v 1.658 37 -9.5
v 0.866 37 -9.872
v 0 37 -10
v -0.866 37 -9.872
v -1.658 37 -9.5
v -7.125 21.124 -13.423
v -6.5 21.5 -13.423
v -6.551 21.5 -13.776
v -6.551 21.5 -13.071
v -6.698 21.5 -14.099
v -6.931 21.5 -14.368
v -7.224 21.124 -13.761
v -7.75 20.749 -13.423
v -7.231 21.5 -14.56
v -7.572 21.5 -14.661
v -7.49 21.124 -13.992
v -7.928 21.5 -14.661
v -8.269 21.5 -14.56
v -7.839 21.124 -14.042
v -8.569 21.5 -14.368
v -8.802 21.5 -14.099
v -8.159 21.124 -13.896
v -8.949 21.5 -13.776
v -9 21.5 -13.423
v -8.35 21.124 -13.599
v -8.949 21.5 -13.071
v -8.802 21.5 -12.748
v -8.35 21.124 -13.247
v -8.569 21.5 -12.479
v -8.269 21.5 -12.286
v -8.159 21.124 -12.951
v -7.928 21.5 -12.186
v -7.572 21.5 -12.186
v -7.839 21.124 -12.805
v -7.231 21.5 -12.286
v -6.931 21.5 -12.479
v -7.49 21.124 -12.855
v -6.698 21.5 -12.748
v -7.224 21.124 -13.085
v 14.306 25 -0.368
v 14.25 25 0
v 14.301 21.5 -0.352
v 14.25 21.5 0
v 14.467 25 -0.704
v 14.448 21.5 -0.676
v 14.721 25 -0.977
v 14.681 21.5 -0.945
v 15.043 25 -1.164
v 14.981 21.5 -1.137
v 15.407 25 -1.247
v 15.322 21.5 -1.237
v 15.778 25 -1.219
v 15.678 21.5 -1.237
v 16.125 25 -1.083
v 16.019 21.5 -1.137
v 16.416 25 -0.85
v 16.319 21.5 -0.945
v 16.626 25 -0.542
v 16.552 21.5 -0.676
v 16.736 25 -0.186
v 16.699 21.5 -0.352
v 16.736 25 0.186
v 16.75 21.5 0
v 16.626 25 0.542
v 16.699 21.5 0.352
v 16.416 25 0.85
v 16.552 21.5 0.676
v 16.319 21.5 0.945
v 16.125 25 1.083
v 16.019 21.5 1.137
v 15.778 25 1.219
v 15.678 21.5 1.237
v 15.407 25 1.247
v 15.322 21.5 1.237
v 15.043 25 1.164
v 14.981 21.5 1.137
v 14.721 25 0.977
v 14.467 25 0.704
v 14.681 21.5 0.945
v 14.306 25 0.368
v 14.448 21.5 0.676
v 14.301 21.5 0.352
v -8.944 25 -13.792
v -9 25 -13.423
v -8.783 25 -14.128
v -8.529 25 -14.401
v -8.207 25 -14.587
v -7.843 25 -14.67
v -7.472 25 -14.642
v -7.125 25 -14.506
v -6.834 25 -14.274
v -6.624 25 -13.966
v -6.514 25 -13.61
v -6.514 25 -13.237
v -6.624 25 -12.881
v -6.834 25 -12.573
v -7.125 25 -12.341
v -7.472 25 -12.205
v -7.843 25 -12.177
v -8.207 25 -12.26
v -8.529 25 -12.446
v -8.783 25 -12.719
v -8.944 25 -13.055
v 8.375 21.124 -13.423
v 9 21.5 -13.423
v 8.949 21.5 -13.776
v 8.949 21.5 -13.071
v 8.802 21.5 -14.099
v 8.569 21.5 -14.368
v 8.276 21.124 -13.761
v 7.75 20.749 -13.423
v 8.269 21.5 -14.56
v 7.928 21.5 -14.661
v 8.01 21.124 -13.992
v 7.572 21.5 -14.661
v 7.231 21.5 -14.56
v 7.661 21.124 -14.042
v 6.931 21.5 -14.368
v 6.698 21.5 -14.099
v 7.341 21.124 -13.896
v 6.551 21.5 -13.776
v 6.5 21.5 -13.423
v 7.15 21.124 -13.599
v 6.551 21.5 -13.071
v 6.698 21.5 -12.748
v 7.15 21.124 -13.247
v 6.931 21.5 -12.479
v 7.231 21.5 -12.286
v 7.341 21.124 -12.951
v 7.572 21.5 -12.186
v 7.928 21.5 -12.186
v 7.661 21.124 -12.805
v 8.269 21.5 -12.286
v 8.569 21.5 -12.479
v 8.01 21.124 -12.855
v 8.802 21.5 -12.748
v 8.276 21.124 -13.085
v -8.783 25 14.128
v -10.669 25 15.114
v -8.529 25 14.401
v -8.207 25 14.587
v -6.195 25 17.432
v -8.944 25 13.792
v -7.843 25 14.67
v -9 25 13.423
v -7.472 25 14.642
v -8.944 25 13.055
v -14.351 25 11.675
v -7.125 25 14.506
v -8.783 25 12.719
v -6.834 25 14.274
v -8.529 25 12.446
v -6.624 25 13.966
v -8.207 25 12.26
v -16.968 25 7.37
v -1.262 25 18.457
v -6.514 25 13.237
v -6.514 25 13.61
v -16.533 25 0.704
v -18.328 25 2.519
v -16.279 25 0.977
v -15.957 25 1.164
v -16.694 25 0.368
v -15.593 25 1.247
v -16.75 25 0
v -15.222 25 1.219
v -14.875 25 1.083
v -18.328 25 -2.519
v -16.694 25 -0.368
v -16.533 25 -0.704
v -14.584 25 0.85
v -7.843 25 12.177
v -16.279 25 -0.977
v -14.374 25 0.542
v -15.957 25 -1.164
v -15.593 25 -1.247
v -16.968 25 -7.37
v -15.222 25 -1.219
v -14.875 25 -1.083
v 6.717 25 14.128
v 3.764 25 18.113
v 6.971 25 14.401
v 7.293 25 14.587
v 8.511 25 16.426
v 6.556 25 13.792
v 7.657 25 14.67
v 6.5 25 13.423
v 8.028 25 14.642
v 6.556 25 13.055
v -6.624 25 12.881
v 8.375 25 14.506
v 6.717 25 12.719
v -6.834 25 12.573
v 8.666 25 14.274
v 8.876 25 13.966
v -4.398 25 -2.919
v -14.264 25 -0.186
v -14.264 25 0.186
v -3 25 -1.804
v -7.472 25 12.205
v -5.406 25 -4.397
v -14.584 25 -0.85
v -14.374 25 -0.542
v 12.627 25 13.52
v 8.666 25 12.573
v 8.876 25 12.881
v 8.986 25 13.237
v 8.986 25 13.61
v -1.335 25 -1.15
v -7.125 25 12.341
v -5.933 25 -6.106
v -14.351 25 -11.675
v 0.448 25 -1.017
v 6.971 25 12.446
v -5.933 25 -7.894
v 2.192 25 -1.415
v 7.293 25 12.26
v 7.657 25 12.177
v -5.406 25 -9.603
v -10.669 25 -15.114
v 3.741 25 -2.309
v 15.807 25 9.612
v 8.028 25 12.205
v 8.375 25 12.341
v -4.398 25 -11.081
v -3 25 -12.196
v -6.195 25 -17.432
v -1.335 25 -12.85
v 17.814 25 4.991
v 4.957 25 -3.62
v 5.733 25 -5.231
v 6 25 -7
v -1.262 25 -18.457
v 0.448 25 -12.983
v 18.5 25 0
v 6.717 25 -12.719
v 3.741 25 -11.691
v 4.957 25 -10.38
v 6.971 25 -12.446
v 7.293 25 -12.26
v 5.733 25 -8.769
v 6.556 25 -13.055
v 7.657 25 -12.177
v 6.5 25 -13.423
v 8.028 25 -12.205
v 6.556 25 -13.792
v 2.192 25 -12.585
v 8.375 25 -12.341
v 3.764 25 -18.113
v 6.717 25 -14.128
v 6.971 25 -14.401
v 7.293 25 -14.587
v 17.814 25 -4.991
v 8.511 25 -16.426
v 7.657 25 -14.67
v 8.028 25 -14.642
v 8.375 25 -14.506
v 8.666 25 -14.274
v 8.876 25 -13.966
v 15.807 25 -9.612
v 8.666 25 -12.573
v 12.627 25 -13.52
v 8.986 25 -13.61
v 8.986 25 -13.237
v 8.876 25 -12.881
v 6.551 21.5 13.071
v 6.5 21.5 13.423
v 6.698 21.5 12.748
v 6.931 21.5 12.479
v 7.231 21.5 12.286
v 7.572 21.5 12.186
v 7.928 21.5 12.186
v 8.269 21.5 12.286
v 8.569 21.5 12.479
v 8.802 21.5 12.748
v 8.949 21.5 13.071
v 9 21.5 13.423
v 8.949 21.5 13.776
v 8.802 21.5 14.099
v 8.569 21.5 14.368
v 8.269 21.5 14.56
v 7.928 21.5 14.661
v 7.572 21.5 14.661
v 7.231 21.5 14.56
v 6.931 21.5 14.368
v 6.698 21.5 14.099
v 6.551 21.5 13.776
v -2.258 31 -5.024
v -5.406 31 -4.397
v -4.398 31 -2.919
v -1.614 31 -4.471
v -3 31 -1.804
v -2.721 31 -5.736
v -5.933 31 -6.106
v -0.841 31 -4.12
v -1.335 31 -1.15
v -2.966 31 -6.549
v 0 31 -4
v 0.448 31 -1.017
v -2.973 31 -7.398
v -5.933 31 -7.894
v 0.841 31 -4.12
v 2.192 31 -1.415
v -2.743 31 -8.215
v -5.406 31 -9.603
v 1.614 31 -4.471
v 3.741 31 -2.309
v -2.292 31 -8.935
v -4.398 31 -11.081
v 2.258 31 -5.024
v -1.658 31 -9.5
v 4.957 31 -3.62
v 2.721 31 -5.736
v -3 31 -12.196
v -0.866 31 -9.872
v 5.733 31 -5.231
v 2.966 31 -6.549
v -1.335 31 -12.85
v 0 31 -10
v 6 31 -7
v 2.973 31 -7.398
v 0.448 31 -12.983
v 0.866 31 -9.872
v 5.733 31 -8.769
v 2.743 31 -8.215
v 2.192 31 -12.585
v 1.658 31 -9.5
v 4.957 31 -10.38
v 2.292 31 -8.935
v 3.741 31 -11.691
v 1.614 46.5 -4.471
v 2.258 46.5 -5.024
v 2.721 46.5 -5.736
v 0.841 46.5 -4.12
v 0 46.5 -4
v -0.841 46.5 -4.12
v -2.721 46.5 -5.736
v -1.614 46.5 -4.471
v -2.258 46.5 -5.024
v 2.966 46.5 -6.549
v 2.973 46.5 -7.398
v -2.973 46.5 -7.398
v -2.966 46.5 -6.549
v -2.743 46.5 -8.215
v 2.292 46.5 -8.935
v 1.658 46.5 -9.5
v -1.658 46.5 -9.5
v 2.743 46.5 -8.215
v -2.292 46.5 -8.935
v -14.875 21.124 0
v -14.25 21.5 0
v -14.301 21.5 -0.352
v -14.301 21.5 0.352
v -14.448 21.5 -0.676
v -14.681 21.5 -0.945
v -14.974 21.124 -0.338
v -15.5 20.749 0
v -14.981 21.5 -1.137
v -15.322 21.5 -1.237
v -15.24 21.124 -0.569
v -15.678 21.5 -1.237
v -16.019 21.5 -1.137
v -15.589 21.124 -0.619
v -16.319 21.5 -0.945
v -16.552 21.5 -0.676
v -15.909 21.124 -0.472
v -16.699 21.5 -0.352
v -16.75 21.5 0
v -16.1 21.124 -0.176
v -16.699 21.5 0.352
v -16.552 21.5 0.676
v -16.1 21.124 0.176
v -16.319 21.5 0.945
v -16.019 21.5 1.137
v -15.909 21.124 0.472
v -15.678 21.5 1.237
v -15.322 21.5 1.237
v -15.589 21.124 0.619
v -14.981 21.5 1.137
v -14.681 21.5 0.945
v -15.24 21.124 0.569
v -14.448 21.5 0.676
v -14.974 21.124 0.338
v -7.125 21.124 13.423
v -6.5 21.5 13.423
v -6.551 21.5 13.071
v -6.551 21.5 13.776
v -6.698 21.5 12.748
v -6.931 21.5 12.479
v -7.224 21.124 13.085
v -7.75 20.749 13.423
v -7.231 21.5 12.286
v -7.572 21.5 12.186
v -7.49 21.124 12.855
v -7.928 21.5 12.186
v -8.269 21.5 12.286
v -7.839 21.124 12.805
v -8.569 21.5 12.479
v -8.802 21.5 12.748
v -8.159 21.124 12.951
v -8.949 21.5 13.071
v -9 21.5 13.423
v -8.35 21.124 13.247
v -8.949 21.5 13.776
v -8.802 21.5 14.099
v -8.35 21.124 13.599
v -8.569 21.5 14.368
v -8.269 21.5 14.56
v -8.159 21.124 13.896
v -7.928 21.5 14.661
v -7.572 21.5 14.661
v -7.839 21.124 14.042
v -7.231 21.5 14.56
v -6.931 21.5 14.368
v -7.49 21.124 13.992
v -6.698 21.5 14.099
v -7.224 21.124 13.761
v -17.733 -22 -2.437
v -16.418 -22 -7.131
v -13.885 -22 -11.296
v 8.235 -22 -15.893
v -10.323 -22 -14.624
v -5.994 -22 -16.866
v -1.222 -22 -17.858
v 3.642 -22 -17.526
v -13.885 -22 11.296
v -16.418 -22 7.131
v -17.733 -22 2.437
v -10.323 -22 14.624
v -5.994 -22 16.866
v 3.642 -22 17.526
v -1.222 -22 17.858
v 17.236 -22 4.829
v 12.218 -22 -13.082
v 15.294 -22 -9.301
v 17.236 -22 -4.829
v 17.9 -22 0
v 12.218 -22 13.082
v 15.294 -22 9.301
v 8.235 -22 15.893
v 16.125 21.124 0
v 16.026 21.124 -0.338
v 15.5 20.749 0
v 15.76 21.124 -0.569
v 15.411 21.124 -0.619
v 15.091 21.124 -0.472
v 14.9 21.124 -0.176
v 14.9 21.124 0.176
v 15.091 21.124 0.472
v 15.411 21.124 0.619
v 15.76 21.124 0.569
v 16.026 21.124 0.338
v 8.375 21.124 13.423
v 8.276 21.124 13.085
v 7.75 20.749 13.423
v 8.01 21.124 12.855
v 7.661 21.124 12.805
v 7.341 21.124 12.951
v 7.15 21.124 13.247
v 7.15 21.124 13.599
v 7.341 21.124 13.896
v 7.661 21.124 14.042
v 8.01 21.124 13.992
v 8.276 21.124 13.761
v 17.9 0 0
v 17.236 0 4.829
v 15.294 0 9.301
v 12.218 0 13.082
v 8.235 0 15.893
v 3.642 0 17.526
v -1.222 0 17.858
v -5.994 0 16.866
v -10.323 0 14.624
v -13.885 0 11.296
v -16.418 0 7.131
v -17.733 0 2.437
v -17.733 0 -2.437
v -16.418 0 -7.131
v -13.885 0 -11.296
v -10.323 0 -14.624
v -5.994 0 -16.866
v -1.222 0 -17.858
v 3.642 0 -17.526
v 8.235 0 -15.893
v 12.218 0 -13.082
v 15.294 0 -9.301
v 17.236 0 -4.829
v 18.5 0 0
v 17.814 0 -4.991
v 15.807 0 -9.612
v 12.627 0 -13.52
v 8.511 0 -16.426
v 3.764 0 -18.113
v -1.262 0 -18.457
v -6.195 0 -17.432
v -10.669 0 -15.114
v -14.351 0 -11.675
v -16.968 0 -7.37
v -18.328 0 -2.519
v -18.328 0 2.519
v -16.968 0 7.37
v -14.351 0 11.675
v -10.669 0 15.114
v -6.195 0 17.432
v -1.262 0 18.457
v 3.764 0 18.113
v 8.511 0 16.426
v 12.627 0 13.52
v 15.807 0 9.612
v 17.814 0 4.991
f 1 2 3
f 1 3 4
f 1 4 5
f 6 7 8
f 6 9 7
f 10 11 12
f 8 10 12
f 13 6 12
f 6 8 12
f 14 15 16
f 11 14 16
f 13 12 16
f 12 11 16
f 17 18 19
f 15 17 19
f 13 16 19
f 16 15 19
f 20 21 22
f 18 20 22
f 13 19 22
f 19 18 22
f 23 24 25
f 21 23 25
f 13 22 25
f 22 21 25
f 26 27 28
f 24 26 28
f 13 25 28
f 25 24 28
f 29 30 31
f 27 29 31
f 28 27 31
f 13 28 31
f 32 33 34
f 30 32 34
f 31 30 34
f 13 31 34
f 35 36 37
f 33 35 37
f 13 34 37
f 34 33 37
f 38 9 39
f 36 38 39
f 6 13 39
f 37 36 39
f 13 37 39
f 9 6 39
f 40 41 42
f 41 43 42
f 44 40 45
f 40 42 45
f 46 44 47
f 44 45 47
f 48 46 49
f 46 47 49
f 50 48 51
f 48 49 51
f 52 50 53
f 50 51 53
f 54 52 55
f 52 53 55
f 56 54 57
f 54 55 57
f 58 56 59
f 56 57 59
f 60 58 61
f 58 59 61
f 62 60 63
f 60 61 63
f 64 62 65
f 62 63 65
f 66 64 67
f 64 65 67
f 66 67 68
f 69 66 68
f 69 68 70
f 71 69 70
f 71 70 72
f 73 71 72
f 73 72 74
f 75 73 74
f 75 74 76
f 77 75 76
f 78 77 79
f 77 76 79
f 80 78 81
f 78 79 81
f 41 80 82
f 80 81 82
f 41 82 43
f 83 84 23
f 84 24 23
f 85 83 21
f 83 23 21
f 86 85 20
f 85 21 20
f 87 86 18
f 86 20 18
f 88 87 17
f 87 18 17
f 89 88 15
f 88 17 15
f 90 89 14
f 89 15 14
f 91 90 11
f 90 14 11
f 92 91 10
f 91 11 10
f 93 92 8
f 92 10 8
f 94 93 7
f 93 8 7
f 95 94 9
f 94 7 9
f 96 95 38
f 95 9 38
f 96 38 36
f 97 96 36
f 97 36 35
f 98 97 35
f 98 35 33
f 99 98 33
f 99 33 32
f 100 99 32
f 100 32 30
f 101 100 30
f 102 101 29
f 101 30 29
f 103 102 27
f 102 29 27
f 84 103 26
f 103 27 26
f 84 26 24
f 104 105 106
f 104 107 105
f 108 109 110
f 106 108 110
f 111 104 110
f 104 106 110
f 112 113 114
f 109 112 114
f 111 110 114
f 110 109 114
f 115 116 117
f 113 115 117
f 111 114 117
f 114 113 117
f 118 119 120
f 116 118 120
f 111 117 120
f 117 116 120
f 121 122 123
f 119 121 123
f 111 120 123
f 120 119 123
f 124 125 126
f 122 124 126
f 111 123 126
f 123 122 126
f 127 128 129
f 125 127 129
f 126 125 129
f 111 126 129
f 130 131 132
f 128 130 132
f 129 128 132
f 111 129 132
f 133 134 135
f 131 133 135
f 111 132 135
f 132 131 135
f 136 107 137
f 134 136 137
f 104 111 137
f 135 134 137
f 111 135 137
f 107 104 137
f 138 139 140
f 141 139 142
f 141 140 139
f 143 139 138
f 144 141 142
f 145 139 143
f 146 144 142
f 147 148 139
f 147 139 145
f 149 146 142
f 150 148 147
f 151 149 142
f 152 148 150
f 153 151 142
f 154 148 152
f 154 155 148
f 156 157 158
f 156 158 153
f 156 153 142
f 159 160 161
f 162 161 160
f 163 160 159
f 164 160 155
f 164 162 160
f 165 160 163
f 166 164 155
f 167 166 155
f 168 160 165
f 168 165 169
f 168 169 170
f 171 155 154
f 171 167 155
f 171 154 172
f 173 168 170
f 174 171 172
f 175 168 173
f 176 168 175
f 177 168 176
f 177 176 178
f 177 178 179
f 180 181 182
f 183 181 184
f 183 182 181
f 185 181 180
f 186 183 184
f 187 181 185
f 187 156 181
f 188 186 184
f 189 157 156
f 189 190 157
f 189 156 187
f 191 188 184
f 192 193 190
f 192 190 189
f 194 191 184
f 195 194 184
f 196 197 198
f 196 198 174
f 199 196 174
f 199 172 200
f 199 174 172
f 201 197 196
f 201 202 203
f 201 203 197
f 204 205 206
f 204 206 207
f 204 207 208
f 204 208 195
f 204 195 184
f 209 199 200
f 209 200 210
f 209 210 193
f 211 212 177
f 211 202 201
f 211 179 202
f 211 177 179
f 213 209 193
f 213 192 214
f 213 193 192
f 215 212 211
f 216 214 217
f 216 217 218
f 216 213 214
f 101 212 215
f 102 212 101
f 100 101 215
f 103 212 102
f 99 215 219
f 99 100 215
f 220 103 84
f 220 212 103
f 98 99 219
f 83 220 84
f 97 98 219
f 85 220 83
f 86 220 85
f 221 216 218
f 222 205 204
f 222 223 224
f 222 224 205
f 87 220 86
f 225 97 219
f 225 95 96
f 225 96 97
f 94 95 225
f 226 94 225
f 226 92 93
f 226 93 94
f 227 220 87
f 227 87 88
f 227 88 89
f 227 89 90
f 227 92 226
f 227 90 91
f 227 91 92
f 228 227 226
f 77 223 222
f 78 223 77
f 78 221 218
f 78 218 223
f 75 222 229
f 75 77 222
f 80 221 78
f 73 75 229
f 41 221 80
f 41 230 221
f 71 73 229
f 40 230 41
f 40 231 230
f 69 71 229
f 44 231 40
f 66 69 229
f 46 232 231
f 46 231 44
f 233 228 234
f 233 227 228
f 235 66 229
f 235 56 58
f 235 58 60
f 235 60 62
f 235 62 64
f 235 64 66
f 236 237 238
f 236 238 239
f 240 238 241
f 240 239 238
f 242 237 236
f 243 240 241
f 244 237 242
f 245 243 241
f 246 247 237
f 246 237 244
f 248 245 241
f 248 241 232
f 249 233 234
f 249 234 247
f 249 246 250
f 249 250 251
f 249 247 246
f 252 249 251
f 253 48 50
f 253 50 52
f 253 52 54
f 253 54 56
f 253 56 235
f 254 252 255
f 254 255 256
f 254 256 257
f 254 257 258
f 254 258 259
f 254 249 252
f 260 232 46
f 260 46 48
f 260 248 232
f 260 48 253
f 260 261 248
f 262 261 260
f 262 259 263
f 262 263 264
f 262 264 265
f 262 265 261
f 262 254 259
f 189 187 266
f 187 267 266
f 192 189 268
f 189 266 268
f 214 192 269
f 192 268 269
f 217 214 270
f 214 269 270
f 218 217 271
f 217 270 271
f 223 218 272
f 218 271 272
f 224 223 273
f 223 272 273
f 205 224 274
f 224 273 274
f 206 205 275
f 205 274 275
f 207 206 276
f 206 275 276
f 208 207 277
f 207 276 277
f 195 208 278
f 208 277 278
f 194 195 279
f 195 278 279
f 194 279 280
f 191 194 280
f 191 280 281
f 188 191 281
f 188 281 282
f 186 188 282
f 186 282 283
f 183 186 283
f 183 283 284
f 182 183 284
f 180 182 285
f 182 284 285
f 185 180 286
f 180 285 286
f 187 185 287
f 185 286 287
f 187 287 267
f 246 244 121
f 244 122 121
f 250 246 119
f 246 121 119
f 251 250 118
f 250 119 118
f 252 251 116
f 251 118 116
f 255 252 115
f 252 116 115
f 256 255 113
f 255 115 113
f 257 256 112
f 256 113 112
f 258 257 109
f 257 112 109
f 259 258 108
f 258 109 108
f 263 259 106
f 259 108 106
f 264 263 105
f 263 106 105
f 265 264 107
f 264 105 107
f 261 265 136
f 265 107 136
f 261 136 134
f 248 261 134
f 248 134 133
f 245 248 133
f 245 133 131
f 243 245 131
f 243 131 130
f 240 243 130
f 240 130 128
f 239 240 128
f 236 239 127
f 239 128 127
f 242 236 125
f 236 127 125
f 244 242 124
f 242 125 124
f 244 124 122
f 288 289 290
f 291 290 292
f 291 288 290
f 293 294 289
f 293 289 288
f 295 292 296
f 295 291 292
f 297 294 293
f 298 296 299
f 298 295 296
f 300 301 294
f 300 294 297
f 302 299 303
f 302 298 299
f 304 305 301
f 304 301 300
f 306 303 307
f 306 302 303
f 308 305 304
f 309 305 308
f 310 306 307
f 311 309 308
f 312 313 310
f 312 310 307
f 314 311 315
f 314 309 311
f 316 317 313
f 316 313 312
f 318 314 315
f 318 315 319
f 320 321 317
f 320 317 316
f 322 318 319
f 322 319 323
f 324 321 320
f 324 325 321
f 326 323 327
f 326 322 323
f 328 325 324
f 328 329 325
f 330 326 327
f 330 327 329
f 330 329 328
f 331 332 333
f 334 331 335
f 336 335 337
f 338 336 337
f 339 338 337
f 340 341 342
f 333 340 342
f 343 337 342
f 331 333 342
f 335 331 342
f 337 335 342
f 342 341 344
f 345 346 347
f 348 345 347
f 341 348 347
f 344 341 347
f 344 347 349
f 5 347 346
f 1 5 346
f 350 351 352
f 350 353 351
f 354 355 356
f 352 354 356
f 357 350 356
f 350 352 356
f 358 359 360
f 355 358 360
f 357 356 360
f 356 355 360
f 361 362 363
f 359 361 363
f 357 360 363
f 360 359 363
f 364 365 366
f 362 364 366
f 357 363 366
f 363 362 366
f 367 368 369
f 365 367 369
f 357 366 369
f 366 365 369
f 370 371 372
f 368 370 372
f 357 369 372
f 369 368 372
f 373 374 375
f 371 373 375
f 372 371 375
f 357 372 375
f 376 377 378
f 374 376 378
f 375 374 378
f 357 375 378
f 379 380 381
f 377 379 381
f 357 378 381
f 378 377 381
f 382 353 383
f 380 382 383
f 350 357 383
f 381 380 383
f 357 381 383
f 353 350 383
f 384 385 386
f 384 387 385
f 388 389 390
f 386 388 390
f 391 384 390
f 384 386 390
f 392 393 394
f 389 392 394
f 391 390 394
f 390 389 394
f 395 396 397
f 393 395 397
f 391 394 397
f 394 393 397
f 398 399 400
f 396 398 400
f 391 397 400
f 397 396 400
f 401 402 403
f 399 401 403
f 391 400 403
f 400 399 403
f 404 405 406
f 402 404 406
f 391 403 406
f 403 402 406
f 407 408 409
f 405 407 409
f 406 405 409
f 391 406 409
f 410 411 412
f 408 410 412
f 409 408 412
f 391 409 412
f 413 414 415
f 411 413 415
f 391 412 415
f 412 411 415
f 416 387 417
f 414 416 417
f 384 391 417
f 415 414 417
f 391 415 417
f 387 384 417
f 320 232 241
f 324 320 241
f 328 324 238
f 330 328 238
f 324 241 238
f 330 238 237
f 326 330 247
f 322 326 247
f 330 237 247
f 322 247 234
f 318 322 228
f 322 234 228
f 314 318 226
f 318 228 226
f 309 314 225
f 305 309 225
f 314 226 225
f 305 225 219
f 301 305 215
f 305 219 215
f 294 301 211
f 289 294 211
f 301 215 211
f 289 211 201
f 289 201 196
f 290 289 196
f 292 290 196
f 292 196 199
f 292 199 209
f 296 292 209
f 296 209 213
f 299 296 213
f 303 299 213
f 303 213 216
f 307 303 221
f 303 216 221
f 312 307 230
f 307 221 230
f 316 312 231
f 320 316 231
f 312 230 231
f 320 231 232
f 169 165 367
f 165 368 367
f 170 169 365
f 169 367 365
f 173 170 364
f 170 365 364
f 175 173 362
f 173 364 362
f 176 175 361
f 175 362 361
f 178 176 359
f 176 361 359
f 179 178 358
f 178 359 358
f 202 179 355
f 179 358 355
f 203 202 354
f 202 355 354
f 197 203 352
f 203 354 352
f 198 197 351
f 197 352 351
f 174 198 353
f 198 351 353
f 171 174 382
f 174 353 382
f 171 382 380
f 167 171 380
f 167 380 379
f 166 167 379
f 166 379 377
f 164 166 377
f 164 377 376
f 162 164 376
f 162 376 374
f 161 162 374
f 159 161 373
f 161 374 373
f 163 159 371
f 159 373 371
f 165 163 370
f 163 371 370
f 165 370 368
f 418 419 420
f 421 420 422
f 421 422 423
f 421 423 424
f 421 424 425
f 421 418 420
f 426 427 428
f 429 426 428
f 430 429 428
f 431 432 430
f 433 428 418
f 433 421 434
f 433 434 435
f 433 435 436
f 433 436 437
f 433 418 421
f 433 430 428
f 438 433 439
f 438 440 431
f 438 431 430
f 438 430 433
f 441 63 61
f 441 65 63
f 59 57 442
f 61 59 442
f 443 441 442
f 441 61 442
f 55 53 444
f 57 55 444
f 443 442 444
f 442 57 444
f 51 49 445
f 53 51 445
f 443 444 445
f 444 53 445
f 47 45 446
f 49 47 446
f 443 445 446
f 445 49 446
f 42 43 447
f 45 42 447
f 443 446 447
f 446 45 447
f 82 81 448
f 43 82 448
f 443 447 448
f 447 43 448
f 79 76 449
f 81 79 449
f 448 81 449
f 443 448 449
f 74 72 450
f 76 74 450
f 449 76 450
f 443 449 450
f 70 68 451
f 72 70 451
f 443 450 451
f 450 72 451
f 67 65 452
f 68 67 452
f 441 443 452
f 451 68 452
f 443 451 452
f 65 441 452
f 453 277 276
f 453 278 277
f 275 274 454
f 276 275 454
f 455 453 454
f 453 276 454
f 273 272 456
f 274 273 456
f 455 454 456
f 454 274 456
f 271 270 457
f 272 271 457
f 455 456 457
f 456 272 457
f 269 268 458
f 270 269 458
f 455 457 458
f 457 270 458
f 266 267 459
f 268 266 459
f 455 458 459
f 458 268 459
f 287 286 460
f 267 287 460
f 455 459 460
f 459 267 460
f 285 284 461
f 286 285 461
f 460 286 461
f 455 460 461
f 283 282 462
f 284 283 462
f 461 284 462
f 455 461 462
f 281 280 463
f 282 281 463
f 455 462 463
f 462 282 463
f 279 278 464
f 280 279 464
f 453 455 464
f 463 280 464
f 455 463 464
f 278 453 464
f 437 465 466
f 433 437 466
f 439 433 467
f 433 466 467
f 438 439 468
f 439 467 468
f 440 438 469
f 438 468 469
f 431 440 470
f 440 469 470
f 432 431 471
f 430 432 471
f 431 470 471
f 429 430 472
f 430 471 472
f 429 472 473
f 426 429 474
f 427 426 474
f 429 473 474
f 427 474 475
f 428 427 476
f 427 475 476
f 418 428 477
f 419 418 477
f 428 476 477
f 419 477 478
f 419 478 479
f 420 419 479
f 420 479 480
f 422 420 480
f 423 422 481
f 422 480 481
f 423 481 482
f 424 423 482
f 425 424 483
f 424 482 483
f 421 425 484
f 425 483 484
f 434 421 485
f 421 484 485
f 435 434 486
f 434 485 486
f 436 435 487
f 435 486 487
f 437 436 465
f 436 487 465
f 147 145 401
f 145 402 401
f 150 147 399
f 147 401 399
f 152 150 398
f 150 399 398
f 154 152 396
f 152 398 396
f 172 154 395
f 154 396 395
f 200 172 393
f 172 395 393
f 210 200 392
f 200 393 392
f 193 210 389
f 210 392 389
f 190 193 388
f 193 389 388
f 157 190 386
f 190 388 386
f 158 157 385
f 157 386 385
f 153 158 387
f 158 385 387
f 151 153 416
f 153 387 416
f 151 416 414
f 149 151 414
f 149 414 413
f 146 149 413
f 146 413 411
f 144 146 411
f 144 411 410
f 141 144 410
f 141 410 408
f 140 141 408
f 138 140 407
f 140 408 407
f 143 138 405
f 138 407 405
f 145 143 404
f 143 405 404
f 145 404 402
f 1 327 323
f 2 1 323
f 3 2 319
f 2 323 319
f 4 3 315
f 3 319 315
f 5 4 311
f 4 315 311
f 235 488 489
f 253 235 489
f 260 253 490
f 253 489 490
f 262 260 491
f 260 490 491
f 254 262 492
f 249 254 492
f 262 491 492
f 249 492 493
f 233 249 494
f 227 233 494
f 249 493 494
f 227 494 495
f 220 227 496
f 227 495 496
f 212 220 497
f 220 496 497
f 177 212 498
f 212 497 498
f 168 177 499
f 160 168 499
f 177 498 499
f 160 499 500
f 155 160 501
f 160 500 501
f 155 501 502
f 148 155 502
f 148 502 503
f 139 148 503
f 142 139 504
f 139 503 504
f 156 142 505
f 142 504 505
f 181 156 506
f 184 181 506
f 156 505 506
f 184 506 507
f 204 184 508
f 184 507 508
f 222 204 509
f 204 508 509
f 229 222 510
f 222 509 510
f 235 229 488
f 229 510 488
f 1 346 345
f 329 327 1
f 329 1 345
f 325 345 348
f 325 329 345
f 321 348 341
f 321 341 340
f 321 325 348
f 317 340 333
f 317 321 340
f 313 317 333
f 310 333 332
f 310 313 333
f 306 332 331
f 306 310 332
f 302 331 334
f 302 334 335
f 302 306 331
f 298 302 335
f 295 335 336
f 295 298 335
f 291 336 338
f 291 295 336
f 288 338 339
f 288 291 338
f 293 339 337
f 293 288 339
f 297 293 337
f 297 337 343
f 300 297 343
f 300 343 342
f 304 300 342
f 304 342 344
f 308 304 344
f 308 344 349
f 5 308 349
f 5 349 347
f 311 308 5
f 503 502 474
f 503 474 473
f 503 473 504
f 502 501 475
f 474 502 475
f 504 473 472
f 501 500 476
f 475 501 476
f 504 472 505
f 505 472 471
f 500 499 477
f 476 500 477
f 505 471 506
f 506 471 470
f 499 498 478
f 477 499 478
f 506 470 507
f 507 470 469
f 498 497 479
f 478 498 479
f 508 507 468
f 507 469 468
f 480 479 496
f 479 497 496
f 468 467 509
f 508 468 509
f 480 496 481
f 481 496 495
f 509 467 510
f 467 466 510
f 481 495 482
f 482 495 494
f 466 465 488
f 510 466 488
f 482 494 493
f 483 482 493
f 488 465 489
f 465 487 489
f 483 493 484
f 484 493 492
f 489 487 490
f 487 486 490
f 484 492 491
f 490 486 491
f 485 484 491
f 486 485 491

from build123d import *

# Parameters (mm, degrees)
SKETCH1_R                       = 18.499999957
BOSS_EXTRUDE1_DEPTH             = 25.000000038
SKETCH2_R                       = 5.999999938
BOSS_EXTRUDE2_DEPTH             = 5.999999938
BOSS_EXTRUDE3_DEPTH             = 15.499999988
BOSS_EXTRUDE4_DEPTH             = 5.999999938
TAP_DRILL_FOR_M3X0_5_TAP1_D     = 2.5
TAP_DRILL_FOR_M3X0_5_TAP1_DEPTH = 3.499993
TAP_DRILL_FOR_M3X0_5_TAP1_TIP   = 0.751075774
SKETCH7_R                       = 17.900000014
BOSS_EXTRUDE5_DEPTH             = 21.999999942


with BuildPart() as part:
    # Sketch1 → Boss-Extrude1 (new body)
    with BuildSketch(Plane(origin=(0, 0, 0), x_dir=(1, 0, 0), z_dir=(0, 1, 0))):
        Circle(SKETCH1_R)
    extrude(amount=BOSS_EXTRUDE1_DEPTH)

    # Sketch2 → Boss-Extrude2 (add)
    with BuildSketch(Plane(origin=(0, 25.000000038, 0), x_dir=(1, 0, 0), z_dir=(0, 1, 0))):
        with Locations((0, 6.99999997)):
            Circle(SKETCH2_R)
    extrude(amount=BOSS_EXTRUDE2_DEPTH)

    # Sketch3 → Boss-Extrude3 (add)
    with BuildSketch(Plane(origin=(0, 30.999999976, 0), x_dir=(1, 0, 0), z_dir=(0, 1, 0))):
        with BuildLine():
            Line((1.658312218, 9.50000005), (-1.658312218, 9.50000005))
            ThreePointArc((-1.658312218, 9.50000005), (0, 4.000000001), (1.658312218, 9.50000005))
        make_face()
    extrude(amount=BOSS_EXTRUDE3_DEPTH)

    # Sketch3<3> → Boss-Extrude4 (add)
    with BuildSketch(Plane(origin=(0, 30.999999976, 0), x_dir=(1, 0, 0), z_dir=(0, 1, 0))):
        with BuildLine():
            ThreePointArc((1.658312218, 9.50000005), (0, 9.999999939), (-1.658312218, 9.50000005))
            Line((-1.658312218, 9.50000005), (1.658312218, 9.50000005))
        make_face()
    extrude(amount=BOSS_EXTRUDE4_DEPTH)

    # Tap Drill for M3x0.5 Tap1
    with Locations(Plane(origin=(0, 25.000000038, 0), x_dir=(1, 0, 0), z_dir=(0, 1, 0))):
        with Locations((-15.499999988, 0), (-7.749999994, 13.423393748), (7.749999994, 13.423393748), (15.499999988, 0), (7.749999994, -13.423393748), (-7.749999994, -13.423393748)):
            Hole(TAP_DRILL_FOR_M3X0_5_TAP1_D / 2, depth=TAP_DRILL_FOR_M3X0_5_TAP1_DEPTH)
            with Locations((0, 0, -(TAP_DRILL_FOR_M3X0_5_TAP1_DEPTH + TAP_DRILL_FOR_M3X0_5_TAP1_TIP / 2))):  # 118° drill point
                Cone(0, TAP_DRILL_FOR_M3X0_5_TAP1_D / 2, TAP_DRILL_FOR_M3X0_5_TAP1_TIP, mode=Mode.SUBTRACT)

    # Sketch7 → Boss-Extrude5 (add)
    with BuildSketch(Plane.XZ):
        Circle(SKETCH7_R)
    extrude(amount=BOSS_EXTRUDE5_DEPTH)


solid = part.part
